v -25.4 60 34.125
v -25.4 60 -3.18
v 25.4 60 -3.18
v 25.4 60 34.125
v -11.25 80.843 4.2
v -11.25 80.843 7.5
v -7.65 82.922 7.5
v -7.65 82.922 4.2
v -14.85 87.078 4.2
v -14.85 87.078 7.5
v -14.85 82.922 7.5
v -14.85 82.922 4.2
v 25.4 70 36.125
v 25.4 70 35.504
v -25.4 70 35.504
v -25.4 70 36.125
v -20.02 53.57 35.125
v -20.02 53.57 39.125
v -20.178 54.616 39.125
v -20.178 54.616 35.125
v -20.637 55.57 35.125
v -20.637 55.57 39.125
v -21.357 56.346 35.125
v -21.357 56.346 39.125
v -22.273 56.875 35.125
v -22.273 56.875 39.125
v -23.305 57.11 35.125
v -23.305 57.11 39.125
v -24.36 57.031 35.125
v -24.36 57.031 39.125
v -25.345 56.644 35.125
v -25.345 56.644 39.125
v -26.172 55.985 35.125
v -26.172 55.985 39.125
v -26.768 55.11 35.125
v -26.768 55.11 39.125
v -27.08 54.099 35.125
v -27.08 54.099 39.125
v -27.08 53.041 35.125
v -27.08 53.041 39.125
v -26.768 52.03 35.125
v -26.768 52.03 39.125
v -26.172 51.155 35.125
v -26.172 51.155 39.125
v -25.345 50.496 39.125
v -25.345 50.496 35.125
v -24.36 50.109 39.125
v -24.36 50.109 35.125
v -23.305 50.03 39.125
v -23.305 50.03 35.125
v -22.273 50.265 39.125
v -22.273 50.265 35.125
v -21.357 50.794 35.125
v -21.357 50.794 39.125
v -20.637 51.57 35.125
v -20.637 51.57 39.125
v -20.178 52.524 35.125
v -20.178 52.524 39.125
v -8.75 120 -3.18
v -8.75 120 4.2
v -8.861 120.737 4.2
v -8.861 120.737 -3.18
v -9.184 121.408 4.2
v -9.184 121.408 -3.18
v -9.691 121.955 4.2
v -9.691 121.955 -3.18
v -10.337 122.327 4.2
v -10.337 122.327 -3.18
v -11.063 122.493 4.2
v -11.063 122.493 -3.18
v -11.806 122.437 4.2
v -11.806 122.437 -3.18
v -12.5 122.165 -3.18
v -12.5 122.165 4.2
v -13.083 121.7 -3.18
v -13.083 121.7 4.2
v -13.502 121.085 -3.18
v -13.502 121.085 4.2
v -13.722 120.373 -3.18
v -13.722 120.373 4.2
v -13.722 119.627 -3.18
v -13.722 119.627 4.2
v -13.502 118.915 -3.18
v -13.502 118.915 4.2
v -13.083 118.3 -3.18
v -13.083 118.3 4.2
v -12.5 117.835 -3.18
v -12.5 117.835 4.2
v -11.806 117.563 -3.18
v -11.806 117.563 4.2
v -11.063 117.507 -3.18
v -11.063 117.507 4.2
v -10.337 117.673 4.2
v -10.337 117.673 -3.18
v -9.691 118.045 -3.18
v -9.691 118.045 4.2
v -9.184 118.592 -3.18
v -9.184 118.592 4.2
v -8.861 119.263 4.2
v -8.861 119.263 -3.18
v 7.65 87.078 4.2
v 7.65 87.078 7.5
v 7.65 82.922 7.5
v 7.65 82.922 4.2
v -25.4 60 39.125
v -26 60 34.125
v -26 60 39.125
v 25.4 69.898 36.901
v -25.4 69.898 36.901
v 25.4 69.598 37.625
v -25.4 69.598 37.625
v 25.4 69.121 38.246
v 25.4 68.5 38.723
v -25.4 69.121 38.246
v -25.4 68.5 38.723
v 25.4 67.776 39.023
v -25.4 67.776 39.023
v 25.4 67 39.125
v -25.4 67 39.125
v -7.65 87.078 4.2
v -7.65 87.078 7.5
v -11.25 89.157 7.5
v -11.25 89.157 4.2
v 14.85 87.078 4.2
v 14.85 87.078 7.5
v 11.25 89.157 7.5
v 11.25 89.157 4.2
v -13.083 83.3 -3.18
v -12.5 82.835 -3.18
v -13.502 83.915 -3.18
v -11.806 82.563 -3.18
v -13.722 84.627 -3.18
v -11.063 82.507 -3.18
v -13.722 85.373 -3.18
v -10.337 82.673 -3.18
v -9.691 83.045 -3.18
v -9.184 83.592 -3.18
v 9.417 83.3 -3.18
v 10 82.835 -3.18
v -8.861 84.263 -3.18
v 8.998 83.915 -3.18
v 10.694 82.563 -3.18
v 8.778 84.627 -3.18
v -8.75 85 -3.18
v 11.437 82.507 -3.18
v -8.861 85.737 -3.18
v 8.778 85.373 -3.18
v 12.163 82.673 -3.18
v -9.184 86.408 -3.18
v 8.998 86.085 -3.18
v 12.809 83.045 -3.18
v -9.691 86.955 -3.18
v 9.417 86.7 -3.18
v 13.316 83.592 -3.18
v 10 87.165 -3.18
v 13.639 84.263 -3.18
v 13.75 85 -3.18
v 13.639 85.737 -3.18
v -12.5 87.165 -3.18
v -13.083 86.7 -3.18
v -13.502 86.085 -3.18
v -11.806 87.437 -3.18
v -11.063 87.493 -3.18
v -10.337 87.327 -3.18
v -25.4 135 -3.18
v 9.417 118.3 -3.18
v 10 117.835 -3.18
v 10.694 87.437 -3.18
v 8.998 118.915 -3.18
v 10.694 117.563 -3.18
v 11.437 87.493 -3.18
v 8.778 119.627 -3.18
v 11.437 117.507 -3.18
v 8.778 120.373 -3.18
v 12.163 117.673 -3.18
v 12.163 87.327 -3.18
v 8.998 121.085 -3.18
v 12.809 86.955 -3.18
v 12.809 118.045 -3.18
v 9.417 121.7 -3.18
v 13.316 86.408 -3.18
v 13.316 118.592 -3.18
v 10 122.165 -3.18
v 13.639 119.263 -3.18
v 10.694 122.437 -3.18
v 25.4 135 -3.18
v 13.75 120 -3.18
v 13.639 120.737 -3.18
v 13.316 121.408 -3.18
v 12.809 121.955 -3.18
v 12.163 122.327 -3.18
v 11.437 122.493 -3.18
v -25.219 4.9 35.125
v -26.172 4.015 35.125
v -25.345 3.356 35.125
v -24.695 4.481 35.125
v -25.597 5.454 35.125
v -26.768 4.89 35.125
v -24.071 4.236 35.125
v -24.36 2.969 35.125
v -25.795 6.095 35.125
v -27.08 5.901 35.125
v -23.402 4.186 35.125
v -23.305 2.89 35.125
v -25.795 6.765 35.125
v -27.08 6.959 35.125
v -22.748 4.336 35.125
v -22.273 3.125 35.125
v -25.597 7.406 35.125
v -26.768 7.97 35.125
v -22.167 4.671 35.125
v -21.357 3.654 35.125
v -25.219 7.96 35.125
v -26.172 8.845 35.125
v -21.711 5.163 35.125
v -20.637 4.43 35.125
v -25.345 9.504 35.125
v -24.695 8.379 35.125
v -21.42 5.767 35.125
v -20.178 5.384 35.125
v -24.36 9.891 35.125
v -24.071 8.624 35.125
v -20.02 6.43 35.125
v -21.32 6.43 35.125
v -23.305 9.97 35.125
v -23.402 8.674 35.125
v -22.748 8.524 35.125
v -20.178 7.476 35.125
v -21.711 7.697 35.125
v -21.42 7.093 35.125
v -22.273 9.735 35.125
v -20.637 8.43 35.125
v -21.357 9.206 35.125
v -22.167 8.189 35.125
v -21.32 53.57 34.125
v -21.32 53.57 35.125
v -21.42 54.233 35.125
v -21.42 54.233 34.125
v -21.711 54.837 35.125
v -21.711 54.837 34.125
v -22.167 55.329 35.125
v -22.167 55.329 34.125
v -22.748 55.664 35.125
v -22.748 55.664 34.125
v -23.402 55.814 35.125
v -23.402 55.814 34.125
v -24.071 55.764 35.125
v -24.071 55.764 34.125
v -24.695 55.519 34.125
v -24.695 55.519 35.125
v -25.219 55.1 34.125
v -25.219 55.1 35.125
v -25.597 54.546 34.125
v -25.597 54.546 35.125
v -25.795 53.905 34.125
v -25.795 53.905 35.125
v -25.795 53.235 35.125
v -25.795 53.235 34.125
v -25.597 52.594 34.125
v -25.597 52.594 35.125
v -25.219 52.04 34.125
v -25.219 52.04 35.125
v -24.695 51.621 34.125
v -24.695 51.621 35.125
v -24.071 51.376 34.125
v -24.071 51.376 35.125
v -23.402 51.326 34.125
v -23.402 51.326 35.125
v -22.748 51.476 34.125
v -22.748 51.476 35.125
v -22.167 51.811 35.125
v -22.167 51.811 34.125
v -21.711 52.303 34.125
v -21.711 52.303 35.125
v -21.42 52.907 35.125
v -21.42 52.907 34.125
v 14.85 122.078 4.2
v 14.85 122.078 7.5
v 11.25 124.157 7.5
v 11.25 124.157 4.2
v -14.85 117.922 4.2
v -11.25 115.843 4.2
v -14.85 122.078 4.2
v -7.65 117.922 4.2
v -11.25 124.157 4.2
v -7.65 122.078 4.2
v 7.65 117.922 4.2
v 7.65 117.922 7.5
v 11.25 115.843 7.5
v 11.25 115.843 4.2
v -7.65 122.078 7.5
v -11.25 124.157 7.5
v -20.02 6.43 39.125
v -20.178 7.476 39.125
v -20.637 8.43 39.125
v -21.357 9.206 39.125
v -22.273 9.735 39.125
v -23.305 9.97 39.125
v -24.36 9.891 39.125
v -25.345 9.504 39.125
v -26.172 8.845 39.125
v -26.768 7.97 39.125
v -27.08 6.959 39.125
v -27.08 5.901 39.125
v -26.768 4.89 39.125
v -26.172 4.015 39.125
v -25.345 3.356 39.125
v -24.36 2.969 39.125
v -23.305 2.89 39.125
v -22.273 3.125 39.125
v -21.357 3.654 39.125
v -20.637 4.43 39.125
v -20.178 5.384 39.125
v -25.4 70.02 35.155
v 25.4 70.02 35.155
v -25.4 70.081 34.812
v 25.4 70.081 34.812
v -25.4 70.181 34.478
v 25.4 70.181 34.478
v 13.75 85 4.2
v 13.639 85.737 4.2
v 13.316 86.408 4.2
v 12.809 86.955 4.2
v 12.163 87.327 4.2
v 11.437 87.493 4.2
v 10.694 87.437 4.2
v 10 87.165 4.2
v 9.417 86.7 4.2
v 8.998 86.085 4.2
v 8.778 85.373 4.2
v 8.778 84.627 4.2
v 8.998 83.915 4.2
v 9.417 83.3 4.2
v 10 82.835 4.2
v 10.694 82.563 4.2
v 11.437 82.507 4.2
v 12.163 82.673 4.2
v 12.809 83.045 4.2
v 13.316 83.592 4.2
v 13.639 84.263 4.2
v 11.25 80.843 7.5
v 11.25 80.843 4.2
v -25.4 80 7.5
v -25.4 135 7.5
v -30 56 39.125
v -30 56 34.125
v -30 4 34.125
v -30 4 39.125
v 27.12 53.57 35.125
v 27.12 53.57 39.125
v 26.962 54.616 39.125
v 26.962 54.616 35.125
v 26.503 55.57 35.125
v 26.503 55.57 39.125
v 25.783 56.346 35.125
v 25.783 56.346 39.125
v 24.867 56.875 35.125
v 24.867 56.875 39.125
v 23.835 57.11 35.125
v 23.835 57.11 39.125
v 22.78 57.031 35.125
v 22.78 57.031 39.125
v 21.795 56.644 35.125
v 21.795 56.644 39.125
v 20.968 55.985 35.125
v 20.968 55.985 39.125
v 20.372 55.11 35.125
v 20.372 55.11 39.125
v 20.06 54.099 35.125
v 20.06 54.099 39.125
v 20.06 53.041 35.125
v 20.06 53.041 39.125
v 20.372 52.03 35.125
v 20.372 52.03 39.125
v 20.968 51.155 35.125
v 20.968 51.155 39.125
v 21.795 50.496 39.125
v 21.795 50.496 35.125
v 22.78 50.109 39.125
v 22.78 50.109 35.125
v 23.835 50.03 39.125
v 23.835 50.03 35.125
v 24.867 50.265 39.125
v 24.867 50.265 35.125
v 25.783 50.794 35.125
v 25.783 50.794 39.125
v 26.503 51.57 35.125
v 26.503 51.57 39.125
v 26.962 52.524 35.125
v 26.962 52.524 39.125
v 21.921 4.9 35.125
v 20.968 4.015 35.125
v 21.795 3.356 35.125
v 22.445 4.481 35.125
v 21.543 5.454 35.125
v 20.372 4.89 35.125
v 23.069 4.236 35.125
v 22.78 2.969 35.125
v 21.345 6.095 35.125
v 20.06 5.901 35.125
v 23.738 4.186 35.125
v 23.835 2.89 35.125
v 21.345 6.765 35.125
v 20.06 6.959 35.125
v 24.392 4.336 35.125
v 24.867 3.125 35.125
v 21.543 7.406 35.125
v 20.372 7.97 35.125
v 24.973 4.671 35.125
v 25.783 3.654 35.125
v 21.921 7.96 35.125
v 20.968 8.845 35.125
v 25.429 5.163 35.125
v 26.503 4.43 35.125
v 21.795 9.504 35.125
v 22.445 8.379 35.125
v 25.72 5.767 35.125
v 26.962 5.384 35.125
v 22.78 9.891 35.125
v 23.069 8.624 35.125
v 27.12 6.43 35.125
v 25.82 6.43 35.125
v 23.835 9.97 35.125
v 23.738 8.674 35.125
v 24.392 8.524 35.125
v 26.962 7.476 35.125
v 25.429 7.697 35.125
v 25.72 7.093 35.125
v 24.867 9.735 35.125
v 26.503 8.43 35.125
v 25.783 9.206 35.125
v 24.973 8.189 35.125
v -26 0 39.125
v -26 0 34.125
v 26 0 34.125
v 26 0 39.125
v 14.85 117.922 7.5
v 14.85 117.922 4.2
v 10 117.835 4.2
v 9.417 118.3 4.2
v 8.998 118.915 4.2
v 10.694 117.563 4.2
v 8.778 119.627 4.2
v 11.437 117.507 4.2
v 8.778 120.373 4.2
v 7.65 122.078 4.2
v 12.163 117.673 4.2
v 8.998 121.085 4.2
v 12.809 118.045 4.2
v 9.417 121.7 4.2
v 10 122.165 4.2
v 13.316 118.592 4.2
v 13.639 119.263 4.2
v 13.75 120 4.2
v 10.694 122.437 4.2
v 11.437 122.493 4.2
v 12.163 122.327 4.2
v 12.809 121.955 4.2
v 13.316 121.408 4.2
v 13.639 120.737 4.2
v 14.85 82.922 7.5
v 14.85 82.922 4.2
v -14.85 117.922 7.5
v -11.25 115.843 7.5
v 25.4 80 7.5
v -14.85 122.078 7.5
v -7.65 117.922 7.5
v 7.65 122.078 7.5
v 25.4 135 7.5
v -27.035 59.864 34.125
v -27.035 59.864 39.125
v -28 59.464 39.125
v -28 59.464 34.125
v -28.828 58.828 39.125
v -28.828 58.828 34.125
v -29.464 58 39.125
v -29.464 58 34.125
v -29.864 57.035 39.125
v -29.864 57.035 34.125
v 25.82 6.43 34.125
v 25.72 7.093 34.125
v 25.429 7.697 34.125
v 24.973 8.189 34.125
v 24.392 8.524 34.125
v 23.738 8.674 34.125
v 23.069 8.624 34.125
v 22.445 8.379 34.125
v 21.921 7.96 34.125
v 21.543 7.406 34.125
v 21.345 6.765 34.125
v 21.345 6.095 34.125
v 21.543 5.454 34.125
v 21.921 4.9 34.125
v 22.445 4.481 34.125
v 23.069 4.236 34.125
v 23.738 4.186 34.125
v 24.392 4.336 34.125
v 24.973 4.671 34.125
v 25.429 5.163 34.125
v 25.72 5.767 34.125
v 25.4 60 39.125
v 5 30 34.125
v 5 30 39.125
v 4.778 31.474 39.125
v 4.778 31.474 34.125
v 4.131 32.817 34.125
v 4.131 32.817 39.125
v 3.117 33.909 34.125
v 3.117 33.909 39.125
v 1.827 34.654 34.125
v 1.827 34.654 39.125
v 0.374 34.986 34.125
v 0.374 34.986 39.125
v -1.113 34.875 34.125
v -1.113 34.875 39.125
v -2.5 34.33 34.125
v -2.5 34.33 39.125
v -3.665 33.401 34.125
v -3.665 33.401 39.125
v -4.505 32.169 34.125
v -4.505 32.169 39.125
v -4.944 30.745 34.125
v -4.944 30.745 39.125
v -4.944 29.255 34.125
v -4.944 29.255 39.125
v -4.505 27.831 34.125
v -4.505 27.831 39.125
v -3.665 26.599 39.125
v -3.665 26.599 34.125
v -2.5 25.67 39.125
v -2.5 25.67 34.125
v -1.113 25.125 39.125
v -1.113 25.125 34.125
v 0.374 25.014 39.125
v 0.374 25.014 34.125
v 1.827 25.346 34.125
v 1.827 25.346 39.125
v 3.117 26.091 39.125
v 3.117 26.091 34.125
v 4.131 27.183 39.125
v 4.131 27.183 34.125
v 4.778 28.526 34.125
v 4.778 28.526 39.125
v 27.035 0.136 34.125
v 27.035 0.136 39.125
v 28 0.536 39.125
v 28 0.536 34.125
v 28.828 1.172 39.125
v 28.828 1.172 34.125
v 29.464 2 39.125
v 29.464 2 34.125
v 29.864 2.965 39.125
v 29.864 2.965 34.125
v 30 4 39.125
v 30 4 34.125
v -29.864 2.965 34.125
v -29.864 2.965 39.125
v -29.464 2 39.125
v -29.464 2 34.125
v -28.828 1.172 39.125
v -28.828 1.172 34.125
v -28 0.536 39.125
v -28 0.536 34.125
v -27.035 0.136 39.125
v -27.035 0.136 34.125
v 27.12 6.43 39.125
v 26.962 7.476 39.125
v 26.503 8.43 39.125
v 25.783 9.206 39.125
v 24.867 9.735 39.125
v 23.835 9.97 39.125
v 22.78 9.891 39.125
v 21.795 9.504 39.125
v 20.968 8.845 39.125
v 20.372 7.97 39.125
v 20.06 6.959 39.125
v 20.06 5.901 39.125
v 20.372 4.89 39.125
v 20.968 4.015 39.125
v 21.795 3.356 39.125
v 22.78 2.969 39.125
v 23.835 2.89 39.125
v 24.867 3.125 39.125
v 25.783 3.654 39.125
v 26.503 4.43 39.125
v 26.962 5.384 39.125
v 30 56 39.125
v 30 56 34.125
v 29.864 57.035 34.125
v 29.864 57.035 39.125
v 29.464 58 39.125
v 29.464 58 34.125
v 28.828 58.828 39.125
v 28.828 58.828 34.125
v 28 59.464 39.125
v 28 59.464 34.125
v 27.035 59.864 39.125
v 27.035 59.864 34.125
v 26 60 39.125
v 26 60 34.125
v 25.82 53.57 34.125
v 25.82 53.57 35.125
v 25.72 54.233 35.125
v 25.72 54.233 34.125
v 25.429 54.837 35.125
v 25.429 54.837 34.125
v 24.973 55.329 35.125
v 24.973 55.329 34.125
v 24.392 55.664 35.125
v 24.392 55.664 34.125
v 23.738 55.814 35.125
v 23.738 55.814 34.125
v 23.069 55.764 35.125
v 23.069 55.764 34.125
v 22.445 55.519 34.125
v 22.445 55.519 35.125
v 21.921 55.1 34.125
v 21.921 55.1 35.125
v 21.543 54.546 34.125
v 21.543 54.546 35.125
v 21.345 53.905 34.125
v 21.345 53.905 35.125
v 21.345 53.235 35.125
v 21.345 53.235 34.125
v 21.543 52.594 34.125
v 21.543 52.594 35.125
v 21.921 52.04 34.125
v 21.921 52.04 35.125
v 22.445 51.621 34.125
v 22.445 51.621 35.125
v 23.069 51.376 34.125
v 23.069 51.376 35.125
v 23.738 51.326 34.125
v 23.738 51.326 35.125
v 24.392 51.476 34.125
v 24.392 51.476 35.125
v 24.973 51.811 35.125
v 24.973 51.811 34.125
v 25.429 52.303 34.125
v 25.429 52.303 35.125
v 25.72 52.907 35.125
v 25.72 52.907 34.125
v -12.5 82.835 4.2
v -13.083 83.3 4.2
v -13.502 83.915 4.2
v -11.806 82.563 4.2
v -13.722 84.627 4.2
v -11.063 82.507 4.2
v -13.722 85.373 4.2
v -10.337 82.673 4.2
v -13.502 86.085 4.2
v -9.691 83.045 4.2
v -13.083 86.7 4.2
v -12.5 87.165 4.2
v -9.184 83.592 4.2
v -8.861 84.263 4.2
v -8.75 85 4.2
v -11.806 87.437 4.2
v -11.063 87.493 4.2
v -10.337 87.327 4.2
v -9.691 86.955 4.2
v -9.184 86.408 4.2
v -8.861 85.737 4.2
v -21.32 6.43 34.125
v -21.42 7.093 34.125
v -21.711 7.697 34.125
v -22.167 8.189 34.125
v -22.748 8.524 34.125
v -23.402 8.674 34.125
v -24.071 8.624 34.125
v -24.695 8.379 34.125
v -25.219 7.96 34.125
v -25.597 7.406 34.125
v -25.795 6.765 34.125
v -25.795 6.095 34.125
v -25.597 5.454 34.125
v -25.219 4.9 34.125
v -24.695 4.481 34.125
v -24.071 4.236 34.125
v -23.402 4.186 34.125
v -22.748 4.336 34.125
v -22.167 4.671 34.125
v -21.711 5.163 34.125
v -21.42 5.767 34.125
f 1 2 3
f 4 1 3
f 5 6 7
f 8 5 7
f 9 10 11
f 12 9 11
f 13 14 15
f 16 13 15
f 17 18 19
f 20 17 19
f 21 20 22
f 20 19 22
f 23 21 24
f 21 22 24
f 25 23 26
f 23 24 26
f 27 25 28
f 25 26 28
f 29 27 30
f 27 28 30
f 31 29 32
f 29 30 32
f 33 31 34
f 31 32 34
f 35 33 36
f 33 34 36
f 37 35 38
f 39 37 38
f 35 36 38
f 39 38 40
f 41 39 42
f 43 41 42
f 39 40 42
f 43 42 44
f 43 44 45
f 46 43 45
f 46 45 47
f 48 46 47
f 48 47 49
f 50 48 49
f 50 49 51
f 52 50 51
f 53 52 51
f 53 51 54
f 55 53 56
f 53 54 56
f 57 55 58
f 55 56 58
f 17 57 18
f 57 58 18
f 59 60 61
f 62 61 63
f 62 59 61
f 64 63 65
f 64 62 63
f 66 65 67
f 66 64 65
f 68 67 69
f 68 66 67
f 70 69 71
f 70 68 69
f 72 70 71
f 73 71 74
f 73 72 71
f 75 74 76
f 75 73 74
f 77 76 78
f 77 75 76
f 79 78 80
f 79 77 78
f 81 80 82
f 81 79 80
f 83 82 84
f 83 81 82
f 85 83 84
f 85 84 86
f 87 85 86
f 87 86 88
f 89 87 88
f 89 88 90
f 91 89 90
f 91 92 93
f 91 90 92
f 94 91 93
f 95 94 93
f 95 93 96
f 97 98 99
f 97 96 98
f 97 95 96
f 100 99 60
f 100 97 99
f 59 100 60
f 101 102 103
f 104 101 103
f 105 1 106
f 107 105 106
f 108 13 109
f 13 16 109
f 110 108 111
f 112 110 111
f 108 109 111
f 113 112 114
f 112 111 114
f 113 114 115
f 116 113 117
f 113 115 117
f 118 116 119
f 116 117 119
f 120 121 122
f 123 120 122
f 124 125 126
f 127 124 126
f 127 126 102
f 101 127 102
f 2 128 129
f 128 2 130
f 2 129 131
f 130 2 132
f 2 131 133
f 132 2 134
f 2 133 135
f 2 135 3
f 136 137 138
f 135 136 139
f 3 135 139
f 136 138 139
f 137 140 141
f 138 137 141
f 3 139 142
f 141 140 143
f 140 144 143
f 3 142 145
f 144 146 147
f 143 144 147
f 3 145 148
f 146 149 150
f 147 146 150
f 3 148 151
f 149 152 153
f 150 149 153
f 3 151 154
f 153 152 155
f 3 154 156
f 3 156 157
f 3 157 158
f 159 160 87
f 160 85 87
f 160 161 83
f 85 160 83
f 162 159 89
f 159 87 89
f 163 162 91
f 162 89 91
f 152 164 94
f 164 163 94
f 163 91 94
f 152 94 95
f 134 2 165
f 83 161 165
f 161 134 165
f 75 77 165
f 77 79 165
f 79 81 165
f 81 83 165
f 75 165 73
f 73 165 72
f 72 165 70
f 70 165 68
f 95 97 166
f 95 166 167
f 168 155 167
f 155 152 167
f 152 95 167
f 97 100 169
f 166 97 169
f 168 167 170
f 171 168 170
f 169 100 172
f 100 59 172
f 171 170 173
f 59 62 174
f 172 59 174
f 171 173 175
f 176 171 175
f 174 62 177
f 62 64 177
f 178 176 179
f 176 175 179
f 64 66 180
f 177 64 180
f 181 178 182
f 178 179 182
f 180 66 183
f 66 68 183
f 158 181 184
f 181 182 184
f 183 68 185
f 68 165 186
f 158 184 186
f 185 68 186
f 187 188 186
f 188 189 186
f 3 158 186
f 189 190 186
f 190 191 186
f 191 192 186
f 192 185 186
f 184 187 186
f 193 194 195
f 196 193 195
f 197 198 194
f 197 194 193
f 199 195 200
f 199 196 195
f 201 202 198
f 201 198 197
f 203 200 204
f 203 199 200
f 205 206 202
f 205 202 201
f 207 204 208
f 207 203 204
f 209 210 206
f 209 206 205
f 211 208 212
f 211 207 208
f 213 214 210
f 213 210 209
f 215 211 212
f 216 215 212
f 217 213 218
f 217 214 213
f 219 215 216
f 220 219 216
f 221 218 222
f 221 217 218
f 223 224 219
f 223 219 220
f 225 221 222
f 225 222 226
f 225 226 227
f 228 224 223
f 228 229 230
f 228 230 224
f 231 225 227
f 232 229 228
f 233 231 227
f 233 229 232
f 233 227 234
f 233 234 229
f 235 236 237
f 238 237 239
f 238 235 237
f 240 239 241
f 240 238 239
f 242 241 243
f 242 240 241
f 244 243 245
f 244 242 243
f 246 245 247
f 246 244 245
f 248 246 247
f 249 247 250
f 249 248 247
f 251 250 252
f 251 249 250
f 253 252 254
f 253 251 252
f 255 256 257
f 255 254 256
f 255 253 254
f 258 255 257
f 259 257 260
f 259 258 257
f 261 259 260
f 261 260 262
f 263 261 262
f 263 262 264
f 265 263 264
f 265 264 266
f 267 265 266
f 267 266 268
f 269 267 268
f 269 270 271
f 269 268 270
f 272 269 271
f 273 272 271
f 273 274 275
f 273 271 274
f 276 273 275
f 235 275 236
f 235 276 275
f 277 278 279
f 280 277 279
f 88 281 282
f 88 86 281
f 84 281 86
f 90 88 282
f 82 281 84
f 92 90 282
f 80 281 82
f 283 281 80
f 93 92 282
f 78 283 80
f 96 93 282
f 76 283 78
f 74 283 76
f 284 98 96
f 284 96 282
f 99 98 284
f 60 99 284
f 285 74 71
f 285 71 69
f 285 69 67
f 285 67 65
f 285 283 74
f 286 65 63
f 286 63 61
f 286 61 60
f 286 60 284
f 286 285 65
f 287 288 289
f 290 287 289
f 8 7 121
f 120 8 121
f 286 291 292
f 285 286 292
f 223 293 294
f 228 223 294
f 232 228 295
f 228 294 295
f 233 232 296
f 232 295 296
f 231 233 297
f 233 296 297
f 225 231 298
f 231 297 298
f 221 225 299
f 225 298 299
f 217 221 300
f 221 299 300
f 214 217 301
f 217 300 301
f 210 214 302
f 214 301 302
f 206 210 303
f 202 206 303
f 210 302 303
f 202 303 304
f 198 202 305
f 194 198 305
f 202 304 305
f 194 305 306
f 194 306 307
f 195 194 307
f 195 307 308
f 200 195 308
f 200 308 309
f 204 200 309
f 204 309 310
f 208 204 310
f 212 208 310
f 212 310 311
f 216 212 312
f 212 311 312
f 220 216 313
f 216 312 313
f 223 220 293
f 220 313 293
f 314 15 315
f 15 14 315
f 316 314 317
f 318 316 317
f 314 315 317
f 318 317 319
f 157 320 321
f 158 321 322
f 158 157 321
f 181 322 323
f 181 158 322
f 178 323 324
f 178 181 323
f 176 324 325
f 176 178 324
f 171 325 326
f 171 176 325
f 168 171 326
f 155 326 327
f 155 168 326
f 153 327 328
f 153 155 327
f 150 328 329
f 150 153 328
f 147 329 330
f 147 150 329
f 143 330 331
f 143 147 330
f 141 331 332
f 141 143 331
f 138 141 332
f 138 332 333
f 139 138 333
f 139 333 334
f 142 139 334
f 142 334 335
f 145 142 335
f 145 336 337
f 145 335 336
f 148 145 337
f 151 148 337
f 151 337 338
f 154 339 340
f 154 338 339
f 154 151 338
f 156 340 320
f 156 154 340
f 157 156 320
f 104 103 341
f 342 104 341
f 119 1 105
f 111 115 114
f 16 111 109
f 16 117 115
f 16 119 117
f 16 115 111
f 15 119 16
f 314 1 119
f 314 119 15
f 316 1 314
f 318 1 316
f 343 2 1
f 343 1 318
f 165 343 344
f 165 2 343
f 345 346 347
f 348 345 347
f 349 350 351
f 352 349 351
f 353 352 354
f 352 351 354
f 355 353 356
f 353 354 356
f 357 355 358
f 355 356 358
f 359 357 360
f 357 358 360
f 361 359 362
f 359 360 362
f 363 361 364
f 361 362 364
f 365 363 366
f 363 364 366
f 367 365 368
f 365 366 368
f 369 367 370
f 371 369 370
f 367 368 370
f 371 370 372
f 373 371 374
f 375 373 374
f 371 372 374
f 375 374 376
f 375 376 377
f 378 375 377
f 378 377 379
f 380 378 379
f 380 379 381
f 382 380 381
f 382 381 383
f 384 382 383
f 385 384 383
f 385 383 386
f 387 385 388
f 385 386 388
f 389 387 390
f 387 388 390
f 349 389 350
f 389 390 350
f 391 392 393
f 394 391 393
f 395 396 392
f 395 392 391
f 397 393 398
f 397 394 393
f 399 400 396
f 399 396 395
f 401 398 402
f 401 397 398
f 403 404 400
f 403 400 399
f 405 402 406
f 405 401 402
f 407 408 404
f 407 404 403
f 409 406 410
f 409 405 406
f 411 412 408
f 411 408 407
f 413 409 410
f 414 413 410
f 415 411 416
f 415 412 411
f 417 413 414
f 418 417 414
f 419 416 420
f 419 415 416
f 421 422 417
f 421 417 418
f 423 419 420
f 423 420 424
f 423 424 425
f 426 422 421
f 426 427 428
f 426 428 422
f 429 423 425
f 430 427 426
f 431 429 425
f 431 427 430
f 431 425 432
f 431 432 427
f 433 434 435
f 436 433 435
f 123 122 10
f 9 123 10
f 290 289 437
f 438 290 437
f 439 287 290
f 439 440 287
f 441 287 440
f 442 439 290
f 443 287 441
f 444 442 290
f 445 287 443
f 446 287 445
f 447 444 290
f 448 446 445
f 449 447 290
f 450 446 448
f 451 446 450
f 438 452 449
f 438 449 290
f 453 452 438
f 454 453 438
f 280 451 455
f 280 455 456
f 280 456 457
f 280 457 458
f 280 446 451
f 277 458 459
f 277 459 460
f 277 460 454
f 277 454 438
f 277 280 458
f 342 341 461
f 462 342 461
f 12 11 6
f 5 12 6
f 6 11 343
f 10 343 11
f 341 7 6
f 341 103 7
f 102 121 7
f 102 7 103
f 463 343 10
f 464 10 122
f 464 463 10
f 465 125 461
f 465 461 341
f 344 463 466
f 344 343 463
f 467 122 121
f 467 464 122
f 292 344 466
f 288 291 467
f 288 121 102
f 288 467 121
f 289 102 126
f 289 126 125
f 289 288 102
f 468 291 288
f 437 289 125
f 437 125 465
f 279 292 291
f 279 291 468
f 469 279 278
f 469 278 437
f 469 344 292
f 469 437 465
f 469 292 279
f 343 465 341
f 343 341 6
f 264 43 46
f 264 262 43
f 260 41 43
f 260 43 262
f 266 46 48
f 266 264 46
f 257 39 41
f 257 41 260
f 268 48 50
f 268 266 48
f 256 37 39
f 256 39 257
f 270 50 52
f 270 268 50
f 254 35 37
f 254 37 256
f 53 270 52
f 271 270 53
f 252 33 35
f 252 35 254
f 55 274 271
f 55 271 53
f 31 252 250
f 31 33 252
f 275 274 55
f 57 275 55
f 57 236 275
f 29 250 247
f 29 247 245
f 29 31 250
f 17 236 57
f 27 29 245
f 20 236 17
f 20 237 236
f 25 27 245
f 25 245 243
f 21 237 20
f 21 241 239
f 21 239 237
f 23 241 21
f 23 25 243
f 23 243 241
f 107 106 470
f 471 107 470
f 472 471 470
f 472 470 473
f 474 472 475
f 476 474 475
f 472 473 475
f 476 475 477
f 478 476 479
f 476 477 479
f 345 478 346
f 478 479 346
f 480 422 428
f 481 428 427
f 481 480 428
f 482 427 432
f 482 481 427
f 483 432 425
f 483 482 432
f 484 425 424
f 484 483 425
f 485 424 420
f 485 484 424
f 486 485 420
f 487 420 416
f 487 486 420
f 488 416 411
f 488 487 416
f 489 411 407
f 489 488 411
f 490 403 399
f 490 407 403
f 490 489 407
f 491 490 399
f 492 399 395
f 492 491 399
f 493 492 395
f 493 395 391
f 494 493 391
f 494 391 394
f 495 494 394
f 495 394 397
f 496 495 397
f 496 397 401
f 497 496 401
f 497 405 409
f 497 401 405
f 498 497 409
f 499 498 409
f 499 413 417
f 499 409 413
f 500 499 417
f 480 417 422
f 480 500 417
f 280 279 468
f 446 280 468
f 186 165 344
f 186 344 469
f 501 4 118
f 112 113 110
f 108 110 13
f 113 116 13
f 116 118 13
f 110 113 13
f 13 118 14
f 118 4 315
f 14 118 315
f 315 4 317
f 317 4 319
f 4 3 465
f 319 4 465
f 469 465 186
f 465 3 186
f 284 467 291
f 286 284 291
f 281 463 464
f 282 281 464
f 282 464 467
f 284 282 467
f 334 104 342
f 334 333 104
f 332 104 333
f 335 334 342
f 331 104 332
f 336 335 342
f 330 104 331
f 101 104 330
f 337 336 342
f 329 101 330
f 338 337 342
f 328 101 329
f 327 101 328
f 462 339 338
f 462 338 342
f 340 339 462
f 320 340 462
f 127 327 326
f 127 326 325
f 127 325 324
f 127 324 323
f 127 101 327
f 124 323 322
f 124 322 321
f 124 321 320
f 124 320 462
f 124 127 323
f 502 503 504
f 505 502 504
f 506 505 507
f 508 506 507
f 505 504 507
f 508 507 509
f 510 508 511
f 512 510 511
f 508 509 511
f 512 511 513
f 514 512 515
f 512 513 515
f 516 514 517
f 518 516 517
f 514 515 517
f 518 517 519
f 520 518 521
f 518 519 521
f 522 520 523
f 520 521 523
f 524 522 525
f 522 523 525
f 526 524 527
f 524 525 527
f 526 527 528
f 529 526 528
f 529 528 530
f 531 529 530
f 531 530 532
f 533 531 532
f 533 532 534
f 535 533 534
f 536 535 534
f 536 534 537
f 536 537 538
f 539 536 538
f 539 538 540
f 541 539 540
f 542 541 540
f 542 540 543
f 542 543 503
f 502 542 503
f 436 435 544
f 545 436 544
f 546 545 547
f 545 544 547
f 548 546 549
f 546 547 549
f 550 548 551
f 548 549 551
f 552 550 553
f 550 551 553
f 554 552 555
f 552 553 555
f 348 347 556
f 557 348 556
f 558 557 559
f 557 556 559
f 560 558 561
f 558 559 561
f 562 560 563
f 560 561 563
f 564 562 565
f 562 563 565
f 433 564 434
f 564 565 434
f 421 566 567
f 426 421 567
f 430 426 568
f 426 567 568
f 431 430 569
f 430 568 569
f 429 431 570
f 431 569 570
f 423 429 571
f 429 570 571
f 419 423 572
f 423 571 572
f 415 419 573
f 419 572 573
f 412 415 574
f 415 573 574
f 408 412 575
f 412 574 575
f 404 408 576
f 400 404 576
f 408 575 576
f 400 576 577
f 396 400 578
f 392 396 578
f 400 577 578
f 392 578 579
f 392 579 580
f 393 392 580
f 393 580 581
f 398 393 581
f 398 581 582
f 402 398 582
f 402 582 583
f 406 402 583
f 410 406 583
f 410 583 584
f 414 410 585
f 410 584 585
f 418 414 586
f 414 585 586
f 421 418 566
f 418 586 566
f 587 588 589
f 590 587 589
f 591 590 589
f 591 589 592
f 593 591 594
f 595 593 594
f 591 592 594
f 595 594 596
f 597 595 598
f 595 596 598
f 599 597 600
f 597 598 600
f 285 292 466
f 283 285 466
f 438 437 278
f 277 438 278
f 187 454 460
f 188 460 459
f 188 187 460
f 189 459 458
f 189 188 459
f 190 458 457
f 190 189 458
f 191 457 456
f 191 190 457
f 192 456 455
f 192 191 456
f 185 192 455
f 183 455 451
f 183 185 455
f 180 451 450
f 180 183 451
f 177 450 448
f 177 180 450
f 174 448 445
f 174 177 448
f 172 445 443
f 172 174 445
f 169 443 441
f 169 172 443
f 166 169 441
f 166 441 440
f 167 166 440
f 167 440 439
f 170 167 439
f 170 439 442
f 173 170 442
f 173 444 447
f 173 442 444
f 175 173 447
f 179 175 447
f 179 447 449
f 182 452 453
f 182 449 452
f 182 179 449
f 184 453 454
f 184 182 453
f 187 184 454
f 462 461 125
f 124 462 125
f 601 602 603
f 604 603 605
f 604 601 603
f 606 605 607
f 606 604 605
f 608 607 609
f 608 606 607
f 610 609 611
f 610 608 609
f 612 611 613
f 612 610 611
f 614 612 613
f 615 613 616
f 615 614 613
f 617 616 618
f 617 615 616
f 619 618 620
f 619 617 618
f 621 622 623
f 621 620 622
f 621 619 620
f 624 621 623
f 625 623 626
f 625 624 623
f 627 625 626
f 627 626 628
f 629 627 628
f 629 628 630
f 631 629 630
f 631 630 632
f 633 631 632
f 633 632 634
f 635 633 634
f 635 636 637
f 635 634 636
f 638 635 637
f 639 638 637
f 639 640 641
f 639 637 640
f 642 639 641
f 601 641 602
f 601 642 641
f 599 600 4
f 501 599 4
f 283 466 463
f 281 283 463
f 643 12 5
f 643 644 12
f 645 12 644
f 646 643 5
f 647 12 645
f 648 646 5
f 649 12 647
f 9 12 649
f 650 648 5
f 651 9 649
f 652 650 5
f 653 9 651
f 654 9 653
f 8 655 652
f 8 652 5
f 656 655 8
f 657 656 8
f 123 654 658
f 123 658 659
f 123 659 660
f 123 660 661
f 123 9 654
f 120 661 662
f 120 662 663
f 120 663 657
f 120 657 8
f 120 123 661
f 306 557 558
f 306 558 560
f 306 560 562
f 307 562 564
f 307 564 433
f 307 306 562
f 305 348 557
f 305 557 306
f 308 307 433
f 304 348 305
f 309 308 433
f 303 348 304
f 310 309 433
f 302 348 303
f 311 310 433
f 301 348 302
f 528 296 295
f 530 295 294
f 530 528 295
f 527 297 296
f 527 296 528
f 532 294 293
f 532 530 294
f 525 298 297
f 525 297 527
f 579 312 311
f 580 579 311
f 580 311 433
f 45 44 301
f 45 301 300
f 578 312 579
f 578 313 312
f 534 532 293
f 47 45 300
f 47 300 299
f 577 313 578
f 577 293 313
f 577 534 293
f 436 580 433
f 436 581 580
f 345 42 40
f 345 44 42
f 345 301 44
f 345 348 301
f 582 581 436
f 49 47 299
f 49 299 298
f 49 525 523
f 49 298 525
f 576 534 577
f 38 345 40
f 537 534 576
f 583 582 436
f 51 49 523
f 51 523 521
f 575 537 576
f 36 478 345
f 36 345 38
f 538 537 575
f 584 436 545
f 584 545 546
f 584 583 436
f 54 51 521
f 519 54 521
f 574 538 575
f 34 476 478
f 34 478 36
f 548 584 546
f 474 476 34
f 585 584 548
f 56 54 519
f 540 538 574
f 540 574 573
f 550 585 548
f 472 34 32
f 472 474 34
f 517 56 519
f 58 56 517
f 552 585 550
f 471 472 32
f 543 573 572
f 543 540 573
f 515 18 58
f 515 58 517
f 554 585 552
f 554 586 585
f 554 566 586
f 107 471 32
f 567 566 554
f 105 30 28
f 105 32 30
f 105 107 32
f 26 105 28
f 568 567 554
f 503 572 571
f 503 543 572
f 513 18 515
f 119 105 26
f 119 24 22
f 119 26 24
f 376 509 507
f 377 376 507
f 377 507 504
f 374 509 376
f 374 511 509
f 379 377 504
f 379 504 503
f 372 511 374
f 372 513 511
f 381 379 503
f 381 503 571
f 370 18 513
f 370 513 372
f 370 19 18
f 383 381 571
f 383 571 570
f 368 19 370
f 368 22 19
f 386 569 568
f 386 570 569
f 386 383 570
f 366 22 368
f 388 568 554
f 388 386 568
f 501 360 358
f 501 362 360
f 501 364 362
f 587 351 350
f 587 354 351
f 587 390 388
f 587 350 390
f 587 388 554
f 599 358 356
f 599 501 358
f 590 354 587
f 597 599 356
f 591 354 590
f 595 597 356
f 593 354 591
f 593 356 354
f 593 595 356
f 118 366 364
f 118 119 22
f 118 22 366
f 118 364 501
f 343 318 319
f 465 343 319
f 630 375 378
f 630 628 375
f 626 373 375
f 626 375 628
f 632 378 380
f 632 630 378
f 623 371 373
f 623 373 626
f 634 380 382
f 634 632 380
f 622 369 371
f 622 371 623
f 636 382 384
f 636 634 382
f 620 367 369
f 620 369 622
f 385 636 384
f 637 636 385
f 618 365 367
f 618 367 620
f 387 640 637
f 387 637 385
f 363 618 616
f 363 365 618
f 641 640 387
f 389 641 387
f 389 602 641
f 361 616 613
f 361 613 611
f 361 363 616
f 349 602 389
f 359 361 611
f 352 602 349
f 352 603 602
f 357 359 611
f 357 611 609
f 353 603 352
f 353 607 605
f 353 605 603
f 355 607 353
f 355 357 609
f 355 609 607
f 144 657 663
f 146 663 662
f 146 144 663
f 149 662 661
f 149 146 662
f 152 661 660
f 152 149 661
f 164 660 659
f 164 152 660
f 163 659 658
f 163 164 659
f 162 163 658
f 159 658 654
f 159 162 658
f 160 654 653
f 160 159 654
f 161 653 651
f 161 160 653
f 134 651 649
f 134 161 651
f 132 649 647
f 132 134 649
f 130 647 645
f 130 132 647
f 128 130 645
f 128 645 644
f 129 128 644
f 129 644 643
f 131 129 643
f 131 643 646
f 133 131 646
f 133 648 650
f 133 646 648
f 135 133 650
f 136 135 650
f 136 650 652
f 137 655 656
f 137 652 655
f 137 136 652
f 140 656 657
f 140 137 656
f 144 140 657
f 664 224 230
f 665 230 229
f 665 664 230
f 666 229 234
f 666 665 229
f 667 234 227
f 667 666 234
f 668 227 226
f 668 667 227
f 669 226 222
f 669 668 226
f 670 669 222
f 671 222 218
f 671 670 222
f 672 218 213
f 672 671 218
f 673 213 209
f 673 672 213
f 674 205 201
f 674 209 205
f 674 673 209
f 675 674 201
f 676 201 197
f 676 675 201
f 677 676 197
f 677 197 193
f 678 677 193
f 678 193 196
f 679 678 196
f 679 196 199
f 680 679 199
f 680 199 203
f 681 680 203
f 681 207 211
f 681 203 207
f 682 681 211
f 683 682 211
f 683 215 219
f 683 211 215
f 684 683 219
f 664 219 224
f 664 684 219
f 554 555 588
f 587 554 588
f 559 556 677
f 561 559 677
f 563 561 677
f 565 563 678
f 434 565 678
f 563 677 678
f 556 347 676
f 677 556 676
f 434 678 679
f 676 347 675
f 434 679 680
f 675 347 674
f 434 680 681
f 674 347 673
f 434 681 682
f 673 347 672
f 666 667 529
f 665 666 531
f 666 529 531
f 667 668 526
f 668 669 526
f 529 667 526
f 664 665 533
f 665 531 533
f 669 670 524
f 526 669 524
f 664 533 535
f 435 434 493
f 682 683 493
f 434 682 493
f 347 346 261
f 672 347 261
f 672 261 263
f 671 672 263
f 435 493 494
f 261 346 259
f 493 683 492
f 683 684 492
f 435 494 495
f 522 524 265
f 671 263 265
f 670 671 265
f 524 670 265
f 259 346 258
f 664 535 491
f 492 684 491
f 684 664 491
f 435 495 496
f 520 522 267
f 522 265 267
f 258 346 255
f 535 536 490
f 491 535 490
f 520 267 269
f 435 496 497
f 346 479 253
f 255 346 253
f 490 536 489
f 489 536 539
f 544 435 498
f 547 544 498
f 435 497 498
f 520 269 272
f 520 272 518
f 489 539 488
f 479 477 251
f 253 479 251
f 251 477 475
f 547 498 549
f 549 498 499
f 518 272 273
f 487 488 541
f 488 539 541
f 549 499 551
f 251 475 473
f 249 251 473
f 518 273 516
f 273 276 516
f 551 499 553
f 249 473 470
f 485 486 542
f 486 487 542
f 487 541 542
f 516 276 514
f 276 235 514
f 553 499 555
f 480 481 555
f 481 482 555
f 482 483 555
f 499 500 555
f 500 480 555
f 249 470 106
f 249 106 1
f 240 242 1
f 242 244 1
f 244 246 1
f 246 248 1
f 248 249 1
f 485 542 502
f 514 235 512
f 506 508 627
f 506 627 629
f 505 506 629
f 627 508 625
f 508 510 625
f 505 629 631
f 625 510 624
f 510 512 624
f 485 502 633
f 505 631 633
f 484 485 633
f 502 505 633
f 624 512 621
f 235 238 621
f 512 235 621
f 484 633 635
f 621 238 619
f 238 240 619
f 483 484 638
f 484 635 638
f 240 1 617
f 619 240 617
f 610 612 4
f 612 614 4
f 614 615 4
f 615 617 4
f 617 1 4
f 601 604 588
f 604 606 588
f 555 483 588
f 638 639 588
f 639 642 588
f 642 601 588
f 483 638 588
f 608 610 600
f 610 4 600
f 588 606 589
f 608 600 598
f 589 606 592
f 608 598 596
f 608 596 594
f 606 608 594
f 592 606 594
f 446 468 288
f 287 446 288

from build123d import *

# Parameters (mm, degrees)
SKETCH1_W           = 50.8
SKETCH1_H           = 65.000000038
SKETCH1_R           = 2.5
EXTRUDE_5_DEPTH     = 7.5
SKETCH1_3_W         = 50.8
SKETCH1_3_H         = 10
BOSS_EXTRUDE1_DEPTH = 34.125
BOSS_EXTRUDE2_START = 34.125
SKETCH1_4_R         = 2.25
BOSS_EXTRUDE2_DEPTH = 5
CHAMFER1_SIZE       = 10
CHAMFER1_SIZE2      = 27.474774195
FILLET1_R           = 3
SKETCH2_R           = 5
CUT_EXTRUDE1_DEPTH  = 144.721138443
SKETCH3_R           = 3.55
CUT_EXTRUDE2_DEPTH  = 4
CUT_EXTRUDE3_DEPTH  = 3.3
BOSS_EXTRUDE3_START = -3.18
SKETCH1_5_W         = 50.8
SKETCH1_5_H         = 65.000000038
SKETCH1_5_R         = 2.5
SKETCH1_5_H_2       = 10
BOSS_EXTRUDE3_DEPTH = 3.18


with BuildPart() as part:
    # Sketch1 → 5 (new body)
    with BuildSketch(Plane.XY):
        with Locations((0, 102.500000019)):
            Rectangle(SKETCH1_W, SKETCH1_H)
        with Locations((-11.25, 85.000000038)):
            Circle(SKETCH1_R, mode=Mode.SUBTRACT)
        with Locations((-11.25, 120.000000038)):
            Circle(SKETCH1_R, mode=Mode.SUBTRACT)
        with Locations((11.25, 85.000000038)):
            Circle(SKETCH1_R, mode=Mode.SUBTRACT)
        with Locations((11.25, 120.000000038)):
            Circle(SKETCH1_R, mode=Mode.SUBTRACT)
    extrude(amount=EXTRUDE_5_DEPTH)

    # Sketch1<3> → Boss-Extrude1 (add)
    with BuildSketch(Plane.XY):
        with Locations((0, 65)):
            Rectangle(SKETCH1_3_W, SKETCH1_3_H)
    extrude(amount=BOSS_EXTRUDE1_DEPTH)

    # Sketch1<4> → Boss-Extrude2 (add)
    with BuildSketch(Plane.XY.offset(BOSS_EXTRUDE2_START)):
        with BuildLine():
            Line((-25.4, 70), (-25.4, 60))
            Line((-25.4, 60), (-26, 60))
            ThreePointArc((-26, 60), (-28.828427125, 58.828427125), (-30, 56))
            Line((-30, 56), (-30, 4))
            ThreePointArc((-30, 4), (-28.828427125, 1.171572875), (-26, 0))
            Line((-26, 0), (26, 0))
            ThreePointArc((26, 0), (28.828427125, 1.171572875), (30, 4))
            Line((30, 4), (30, 56))
            ThreePointArc((30, 56), (28.828427125, 58.828427125), (26, 60))
            Line((26, 60), (25.4, 60))
            Line((25.4, 60), (25.4, 70))
            Line((25.4, 70), (-25.4, 70))
        make_face()
        with Locations((23.57, 53.57)):
            Circle(SKETCH1_4_R, mode=Mode.SUBTRACT)
        with Locations((-23.57, 6.43)):
            Circle(SKETCH1_4_R, mode=Mode.SUBTRACT)
        with Locations((-23.57, 53.57)):
            Circle(SKETCH1_4_R, mode=Mode.SUBTRACT)
        with Locations((23.57, 6.43)):
            Circle(SKETCH1_4_R, mode=Mode.SUBTRACT)
    extrude(amount=BOSS_EXTRUDE2_DEPTH)

    # Chamfer1
    chamfer1_edges = [part.edges().sort_by_distance(p)[0] for p in [
        (0, 70, 7.5),
    ]]
    chamfer1_side = [part.faces().sort_by_distance(p)[0] for p in [
        (0, 102.500000019, 7.5),
    ]]
    chamfer(chamfer1_edges, length=CHAMFER1_SIZE, length2=CHAMFER1_SIZE2, reference=chamfer1_side[0])

    # Fillet1
    fillet1_edges = [part.edges().sort_by_distance(p)[0] for p in [
        (0, 70, 39.125),
        (0, 70, 34.974774195),
    ]]
    fillet(fillet1_edges, radius=FILLET1_R)

    # Sketch2 → Cut-Extrude1 (cut, through all)
    with BuildSketch(Plane.XY.offset(39.125)):
        with Locations((0, 30)):
            Circle(SKETCH2_R)
    extrude(amount=-CUT_EXTRUDE1_DEPTH, mode=Mode.SUBTRACT)

    # Sketch3 → Cut-Extrude2 (cut)
    with BuildSketch(Plane.XY.offset(39.125)):
        with Locations((-23.57, 53.57)):
            Circle(SKETCH3_R)
        with Locations((23.57, 53.57)):
            Circle(SKETCH3_R)
        with Locations((-23.57, 6.43)):
            Circle(SKETCH3_R)
        with Locations((23.57, 6.43)):
            Circle(SKETCH3_R)
    extrude(amount=-CUT_EXTRUDE2_DEPTH, mode=Mode.SUBTRACT)

    # Sketch4 → Cut-Extrude3 (cut)
    with BuildSketch(Plane.XY.offset(7.5)):
        Polygon((-11.25, 124.156921976), (-14.85, 122.078461007), (-14.85, 117.921539069), (-11.25, 115.8430781), (-7.65, 117.921539069), (-7.65, 122.078461007), align=None)
        Polygon((11.25, 124.156921976), (7.65, 122.078461007), (7.65, 117.921539069), (11.25, 115.8430781), (14.85, 117.921539069), (14.85, 122.078461007), align=None)
        Polygon((-11.25, 89.156921976), (-14.85, 87.078461007), (-14.85, 82.921539069), (-11.25, 80.8430781), (-7.65, 82.921539069), (-7.65, 87.078461007), align=None)
        Polygon((11.25, 89.156921976), (7.65, 87.078461007), (7.65, 82.921539069), (11.25, 80.8430781), (14.85, 82.921539069), (14.85, 87.078461007), align=None)
    extrude(amount=-CUT_EXTRUDE3_DEPTH, mode=Mode.SUBTRACT)

    # Sketch1<5> → Boss-Extrude3 (add)
    # profile 1 of 2: a face of its own
    with BuildSketch(Plane.XY.offset(BOSS_EXTRUDE3_START)):
        with Locations((0, 102.500000019)):
            Rectangle(SKETCH1_5_W, SKETCH1_5_H)
        with Locations((-11.25, 85.000000038)):
            Circle(SKETCH1_5_R, mode=Mode.SUBTRACT)
        with Locations((-11.25, 120.000000038)):
            Circle(SKETCH1_5_R, mode=Mode.SUBTRACT)
        with Locations((11.25, 85.000000038)):
            Circle(SKETCH1_5_R, mode=Mode.SUBTRACT)
        with Locations((11.25, 120.000000038)):
            Circle(SKETCH1_5_R, mode=Mode.SUBTRACT)
    # profile 2 of 2: a face of its own
    with BuildSketch(Plane.XY.offset(BOSS_EXTRUDE3_START)):
        with Locations((0, 65)):
            Rectangle(SKETCH1_5_W, SKETCH1_5_H_2)
    extrude(amount=BOSS_EXTRUDE3_DEPTH)


solid = part.part
